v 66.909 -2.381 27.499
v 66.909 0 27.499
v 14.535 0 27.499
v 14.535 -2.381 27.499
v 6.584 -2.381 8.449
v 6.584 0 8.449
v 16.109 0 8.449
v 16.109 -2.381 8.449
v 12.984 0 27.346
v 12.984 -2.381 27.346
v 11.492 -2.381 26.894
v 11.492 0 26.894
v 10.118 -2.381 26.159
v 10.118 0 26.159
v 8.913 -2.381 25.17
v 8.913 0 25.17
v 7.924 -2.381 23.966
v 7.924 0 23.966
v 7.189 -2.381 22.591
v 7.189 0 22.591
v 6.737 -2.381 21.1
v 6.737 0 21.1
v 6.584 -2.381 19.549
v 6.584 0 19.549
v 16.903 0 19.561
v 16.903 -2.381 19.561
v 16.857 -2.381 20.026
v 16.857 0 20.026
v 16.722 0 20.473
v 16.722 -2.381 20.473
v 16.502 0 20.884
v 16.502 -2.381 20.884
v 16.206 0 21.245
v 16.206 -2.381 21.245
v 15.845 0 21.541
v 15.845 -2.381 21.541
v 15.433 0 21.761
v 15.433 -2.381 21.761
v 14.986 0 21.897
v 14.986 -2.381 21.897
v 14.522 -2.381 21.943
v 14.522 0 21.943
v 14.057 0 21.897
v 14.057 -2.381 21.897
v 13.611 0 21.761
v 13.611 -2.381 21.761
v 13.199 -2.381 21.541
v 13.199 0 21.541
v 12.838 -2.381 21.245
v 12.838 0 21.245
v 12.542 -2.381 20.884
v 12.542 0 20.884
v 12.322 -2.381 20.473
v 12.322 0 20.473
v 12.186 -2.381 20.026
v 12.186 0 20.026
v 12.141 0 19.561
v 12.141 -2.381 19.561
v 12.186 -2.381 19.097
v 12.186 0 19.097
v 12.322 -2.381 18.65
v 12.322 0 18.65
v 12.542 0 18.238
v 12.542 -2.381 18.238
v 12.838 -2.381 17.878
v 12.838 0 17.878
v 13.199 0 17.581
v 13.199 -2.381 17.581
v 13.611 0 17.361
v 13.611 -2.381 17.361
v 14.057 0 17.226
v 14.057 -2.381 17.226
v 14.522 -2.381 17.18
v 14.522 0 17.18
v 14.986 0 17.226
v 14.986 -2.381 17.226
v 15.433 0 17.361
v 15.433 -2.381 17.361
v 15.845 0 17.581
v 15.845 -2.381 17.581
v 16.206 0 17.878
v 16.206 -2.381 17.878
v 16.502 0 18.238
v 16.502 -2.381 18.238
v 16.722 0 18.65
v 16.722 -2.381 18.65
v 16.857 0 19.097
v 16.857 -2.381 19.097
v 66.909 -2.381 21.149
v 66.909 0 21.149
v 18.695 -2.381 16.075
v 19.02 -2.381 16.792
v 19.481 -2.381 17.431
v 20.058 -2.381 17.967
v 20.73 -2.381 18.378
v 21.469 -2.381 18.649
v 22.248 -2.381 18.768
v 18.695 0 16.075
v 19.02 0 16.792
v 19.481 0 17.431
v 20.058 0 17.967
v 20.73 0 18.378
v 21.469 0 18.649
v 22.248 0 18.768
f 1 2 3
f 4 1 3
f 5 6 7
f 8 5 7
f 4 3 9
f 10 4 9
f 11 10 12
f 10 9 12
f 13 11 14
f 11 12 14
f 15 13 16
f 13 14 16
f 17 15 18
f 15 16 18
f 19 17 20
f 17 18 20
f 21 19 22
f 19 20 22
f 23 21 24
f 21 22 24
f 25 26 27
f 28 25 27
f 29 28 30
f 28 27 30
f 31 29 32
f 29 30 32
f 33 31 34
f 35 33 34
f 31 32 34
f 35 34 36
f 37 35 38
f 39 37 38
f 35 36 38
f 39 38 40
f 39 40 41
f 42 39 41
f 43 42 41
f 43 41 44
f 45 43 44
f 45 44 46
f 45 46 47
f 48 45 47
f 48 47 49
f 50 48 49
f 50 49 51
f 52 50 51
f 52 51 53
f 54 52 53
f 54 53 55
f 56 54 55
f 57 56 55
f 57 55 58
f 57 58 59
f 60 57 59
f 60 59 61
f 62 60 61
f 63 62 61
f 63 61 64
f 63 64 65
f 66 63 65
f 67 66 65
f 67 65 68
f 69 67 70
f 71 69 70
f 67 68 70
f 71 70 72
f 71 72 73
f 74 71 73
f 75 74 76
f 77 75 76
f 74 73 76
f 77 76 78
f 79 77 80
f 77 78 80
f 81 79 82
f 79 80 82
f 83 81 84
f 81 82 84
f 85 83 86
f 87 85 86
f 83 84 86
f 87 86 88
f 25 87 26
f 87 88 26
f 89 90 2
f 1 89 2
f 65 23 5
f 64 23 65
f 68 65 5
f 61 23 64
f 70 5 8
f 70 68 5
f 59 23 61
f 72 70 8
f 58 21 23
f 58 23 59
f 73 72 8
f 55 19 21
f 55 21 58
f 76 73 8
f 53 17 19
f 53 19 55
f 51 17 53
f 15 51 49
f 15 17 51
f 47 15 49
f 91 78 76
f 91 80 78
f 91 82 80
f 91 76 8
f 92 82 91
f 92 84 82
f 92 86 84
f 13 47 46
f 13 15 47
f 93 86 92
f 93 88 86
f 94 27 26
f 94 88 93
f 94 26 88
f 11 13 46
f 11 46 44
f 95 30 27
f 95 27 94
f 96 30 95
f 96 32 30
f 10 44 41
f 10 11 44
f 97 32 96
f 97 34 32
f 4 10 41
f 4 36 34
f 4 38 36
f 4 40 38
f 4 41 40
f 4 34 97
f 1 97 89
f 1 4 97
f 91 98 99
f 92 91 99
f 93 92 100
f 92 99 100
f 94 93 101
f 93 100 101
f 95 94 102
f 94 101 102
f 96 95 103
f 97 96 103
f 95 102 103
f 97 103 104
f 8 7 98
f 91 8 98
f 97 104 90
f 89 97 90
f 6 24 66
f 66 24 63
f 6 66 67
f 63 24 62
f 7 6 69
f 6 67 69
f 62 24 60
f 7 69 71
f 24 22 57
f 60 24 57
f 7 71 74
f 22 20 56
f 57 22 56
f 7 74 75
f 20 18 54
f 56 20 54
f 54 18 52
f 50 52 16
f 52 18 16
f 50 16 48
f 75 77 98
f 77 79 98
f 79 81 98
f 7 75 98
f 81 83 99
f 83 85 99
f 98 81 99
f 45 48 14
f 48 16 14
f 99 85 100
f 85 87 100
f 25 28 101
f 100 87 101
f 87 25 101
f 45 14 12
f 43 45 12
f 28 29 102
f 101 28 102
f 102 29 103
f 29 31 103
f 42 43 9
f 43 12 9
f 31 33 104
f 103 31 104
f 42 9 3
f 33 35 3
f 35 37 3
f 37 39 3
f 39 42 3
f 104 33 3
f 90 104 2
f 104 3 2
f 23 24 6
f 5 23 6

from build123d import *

# Parameters (mm, degrees)
F1_DEPTH = 2.38125
F2_R     = 2.38125
F3_DEPTH = 2.38225


with BuildPart() as f1:
    # F0 (on Front) → F1 (new body)
    with BuildSketch(Plane.XZ):
        with BuildLine():
            Line((66.909325, 27.498861), (14.534525, 27.498861))
            ThreePointArc((14.534525, 27.498861), (8.912885, 25.170302), (6.584325, 19.548661))
            Line((6.584325, 19.548661), (6.584325, 8.448861))
            Line((6.584325, 8.448861), (16.109325, 8.448861))
            Line((16.109325, 8.448861), (18.69467, 16.075104))
            ThreePointArc((18.69467, 16.075104), (20.058081, 17.966739), (22.247746, 18.768327))
            Line((22.247746, 18.768327), (66.909325, 21.148861))
            Line((66.909325, 21.148861), (66.909325, 27.498861))
        make_face()
    extrude(amount=F1_DEPTH)

    # F2 (on face) → F3 (cut, through all)
    with BuildSketch(Plane.XZ.offset(2.38125)):
        with Locations((14.521825, 19.561361)):
            Circle(F2_R)
    extrude(amount=-F3_DEPTH, mode=Mode.SUBTRACT)


solid = f1.part
